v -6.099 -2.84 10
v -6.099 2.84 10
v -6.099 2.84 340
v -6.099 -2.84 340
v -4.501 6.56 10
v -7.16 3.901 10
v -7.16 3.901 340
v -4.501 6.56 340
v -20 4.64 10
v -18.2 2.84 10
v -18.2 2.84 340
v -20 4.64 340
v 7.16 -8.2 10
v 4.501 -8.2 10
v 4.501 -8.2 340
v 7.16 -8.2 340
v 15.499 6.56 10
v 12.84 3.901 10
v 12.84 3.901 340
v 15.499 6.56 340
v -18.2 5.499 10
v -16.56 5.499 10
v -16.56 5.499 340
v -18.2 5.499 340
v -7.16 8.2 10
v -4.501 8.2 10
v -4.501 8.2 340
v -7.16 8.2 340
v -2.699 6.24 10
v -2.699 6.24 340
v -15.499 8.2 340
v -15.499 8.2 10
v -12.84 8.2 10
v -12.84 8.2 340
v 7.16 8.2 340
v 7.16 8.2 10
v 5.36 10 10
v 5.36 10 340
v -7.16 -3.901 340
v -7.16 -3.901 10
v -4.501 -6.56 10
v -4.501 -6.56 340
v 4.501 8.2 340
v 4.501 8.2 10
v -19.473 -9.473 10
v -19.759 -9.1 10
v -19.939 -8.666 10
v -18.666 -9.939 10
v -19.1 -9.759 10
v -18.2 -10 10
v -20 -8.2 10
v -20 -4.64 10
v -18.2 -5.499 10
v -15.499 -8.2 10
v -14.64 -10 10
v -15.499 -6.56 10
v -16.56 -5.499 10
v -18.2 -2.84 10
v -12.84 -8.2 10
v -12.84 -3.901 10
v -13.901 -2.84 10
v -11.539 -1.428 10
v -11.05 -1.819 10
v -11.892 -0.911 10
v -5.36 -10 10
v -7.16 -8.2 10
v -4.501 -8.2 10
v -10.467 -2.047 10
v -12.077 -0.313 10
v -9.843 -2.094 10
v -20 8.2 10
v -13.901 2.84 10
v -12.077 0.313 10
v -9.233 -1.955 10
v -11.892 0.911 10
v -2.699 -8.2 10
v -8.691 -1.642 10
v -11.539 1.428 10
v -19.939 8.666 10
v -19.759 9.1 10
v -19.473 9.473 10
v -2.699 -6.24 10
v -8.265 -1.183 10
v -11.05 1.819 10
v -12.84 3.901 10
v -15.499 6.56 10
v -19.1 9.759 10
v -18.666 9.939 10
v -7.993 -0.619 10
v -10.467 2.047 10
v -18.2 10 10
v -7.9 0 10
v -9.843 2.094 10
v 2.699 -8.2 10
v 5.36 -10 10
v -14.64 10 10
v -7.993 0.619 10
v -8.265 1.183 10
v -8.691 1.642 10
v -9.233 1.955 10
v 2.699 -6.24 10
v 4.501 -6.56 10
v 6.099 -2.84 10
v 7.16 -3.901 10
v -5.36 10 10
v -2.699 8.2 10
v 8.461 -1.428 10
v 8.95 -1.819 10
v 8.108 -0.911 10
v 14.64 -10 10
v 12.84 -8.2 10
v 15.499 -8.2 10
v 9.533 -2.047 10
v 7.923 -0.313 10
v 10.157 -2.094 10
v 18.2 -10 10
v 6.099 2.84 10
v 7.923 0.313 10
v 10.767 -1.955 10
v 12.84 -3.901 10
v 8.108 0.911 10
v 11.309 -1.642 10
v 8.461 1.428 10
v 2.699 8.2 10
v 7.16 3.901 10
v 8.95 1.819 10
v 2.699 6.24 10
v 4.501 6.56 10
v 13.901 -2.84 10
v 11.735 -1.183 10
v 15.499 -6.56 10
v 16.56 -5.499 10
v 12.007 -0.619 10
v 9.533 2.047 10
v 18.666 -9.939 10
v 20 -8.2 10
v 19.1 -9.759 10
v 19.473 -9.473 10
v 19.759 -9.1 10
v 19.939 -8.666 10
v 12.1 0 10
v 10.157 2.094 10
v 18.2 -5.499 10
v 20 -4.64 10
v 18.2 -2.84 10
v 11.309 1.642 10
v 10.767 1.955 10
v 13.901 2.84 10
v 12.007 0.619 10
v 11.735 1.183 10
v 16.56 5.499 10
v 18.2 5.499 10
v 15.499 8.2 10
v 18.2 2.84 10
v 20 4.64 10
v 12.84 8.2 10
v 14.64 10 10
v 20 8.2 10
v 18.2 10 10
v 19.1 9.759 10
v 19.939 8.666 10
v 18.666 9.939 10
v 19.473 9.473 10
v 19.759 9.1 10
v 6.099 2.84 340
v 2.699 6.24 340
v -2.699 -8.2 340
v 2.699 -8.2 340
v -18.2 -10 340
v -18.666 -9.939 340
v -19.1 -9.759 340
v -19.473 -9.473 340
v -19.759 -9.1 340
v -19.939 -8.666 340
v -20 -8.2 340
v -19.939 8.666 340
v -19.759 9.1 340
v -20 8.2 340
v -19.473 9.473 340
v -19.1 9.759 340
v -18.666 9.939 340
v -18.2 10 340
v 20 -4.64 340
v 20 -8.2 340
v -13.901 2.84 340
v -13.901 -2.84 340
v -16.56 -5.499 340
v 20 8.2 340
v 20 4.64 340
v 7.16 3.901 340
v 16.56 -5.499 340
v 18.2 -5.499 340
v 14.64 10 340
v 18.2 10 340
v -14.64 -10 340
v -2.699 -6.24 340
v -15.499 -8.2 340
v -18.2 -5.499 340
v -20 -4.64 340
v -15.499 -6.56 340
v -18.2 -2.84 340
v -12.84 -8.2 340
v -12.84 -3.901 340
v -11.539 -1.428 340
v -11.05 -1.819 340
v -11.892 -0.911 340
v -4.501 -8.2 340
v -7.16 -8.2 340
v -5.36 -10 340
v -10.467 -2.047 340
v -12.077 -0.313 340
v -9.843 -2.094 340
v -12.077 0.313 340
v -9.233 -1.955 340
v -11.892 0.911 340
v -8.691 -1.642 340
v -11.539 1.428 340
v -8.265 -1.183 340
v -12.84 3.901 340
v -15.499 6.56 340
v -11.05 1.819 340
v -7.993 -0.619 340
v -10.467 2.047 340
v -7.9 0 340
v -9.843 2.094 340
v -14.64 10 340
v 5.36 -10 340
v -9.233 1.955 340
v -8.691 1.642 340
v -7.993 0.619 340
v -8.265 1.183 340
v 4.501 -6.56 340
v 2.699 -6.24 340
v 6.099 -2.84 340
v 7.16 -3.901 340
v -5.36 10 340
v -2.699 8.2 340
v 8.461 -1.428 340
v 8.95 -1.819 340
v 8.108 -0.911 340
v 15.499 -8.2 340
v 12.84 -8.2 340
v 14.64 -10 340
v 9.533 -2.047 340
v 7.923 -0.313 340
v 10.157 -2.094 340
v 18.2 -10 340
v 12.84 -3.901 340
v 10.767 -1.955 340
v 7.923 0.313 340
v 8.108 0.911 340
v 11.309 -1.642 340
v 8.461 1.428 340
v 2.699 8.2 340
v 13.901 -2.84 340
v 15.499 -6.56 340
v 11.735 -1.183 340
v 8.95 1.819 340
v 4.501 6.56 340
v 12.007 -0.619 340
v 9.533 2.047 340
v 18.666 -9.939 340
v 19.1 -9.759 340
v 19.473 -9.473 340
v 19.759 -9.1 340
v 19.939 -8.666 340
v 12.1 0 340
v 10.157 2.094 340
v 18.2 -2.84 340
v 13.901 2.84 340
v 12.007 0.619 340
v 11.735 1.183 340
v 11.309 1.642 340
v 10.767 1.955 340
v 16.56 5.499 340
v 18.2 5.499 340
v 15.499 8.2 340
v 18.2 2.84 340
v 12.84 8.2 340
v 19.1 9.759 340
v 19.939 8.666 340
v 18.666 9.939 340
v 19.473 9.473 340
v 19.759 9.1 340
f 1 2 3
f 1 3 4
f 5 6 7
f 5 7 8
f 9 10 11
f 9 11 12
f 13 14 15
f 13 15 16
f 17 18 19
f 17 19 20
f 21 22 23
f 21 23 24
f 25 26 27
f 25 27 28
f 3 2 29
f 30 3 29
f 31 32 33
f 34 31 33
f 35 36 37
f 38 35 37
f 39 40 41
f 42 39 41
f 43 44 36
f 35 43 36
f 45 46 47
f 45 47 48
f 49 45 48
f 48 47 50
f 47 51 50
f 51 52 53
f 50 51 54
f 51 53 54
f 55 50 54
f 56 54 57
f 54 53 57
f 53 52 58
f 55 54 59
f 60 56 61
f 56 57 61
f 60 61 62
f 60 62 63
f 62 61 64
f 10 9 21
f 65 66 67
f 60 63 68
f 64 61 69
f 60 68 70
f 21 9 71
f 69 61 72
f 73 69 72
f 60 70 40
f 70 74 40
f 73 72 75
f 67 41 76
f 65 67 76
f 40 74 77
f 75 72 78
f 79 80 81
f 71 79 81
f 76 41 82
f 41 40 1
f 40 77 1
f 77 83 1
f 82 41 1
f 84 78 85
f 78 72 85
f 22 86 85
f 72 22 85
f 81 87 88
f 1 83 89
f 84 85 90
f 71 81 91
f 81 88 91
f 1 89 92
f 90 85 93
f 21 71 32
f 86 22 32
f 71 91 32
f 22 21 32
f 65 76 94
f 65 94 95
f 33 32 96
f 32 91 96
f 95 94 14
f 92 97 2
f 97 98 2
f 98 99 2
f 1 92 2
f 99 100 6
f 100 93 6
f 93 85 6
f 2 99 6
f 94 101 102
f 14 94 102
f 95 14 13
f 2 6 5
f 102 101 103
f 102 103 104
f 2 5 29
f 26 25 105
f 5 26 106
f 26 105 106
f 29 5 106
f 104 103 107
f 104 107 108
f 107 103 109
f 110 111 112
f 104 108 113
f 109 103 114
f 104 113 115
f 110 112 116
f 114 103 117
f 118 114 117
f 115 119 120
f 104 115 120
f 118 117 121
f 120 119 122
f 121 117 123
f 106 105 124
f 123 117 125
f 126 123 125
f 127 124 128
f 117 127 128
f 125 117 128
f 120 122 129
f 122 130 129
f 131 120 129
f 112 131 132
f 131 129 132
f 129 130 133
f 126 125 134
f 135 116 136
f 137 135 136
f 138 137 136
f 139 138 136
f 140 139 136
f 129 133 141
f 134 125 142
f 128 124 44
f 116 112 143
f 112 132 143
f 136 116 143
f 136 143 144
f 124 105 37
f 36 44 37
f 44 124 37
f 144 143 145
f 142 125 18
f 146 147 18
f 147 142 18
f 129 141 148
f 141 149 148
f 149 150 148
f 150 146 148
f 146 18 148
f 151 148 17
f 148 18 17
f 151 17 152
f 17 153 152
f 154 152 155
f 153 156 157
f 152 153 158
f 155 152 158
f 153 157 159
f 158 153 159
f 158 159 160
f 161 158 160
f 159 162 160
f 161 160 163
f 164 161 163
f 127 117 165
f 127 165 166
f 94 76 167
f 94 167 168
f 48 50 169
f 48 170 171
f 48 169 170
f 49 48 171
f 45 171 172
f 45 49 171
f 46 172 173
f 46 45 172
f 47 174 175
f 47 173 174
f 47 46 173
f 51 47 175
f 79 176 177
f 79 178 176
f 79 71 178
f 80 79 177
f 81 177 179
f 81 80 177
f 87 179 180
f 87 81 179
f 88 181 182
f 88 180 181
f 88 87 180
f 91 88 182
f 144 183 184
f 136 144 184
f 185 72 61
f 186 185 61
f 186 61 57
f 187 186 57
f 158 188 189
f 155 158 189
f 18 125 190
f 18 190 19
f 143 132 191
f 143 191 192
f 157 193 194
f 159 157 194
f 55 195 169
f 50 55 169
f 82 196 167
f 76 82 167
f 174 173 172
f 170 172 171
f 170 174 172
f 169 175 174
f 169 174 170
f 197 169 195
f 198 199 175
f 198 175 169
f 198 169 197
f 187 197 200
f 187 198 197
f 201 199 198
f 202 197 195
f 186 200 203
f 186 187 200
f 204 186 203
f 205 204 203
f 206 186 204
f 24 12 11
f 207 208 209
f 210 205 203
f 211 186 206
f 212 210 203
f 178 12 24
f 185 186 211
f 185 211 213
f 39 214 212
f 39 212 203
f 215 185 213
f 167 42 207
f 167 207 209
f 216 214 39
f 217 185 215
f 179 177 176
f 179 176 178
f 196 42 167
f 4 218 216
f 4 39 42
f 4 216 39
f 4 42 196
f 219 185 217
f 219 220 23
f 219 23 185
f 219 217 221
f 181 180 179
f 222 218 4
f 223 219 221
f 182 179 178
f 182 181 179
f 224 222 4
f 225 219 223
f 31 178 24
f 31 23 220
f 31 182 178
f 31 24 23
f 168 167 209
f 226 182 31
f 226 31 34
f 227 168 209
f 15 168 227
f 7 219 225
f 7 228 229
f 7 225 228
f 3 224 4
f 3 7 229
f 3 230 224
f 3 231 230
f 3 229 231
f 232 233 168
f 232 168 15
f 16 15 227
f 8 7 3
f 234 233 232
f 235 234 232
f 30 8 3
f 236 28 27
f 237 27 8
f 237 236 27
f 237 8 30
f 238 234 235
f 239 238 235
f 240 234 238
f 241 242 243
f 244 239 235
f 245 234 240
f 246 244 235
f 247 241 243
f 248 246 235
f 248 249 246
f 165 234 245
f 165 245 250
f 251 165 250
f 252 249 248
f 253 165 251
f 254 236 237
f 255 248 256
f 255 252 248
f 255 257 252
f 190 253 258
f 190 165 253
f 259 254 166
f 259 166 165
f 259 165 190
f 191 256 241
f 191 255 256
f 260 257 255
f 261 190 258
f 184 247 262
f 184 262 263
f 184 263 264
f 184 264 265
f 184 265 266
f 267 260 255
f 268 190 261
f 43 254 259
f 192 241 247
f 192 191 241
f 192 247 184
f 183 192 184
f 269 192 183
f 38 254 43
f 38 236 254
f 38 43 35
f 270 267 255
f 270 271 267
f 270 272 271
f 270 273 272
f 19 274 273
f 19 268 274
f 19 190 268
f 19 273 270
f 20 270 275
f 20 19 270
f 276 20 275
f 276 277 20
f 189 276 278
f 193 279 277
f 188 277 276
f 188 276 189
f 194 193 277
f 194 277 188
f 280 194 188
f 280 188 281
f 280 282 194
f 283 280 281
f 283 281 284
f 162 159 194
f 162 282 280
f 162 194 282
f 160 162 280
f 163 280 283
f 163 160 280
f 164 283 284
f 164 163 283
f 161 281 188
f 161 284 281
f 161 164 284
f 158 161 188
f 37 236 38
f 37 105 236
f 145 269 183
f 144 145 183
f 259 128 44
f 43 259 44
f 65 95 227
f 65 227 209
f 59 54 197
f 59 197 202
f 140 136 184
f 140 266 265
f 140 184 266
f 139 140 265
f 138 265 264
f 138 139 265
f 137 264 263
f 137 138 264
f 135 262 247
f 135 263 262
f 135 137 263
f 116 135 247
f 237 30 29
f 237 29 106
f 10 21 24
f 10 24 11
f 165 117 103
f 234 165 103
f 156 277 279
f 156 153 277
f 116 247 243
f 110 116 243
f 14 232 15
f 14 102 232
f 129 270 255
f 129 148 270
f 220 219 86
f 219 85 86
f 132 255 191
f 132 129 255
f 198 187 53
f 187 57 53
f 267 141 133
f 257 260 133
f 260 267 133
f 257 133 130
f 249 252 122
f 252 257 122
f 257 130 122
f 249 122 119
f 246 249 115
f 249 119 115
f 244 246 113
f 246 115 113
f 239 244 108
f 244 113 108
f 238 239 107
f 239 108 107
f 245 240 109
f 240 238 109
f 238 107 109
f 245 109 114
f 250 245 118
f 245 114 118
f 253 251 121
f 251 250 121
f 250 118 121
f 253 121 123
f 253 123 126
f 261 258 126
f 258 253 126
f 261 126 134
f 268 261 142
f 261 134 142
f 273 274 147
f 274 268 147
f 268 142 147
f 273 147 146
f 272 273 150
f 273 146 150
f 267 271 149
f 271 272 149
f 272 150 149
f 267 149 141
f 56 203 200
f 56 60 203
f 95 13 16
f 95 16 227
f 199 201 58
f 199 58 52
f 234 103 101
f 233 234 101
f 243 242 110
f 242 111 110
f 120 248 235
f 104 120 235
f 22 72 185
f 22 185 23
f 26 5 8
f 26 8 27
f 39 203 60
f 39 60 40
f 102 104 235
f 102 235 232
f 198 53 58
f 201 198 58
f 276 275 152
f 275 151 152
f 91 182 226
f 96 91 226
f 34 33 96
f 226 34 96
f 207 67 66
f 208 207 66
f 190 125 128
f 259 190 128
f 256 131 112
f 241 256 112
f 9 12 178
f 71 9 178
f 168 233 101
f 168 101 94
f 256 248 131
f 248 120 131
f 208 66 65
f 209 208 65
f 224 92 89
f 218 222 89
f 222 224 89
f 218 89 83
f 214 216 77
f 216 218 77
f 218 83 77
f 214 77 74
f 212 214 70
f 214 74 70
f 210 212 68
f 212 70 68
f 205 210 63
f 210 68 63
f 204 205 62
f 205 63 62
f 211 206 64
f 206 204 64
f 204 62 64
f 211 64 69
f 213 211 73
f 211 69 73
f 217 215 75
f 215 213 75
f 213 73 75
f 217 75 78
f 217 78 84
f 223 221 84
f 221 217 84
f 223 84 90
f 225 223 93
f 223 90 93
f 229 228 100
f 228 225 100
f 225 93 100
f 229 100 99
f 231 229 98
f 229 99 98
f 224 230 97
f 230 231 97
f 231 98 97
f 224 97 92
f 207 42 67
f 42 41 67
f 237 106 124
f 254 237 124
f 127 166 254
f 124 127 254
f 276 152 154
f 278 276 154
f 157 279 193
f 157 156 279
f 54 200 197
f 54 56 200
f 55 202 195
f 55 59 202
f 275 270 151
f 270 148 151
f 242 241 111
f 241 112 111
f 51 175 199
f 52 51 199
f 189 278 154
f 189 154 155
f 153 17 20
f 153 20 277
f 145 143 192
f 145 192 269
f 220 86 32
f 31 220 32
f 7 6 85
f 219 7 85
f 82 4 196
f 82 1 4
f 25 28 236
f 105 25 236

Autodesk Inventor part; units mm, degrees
ref_plane "Start Plane" through (0, 0, 10) normal (0, 0, 1) x (1, 0, 0)
ref_plane "End Plane" through (0, 0, 340) normal (0, 0, 1) x (1, 0, 0)
sketch "Sketch" plane through (0, 0, 0) normal (0, 0, 1) x (1, 0, 0)
  line L0 (0, 0) -> (0, 10) construction
  line L1 (-10, 10) -> (-10, 0) construction
  line L2 (0, 0) -> (-10, 0) construction
  circle A0 centre (-10, 0) radius 2.1
  line L3 (-13.9007, 3.9007) -> (-6.0993, 3.9007) construction
  line L4 (-6.0993, 3.9007) -> (-6.0993, -3.9007) construction
  line L5 (-6.0993, -3.9007) -> (-13.9007, -3.9007) construction
  line L6 (-13.9007, -3.9007) -> (-13.9007, 3.9007) construction
  line L7 (-13.9007, 3.9007) -> (-6.0993, -3.9007) construction
  line L8 (-6.0993, 3.9007) -> (-13.9007, -3.9007) construction
  line L9 (-13.9007, -2.84) -> (-12.84, -3.9007) construction
  line L10 (-13.9007, -2.84) -> (-12.4007, -2.84) construction
  line L11 (-12.84, -3.9007) -> (-15.4993, -6.56)
  line L12 (-15.4993, -6.56) -> (-15.4993, -8.2)
  line L13 (-15.4993, -8.2) -> (-12.84, -8.2)
  line L14 (-12.84, -8.2) -> (-14.64, -10)
  line L15 (-7.16, -3.9007) -> (-4.5007, -6.56)
  line L16 (-4.5007, -6.56) -> (-4.5007, -8.2)
  line L17 (-4.5007, -8.2) -> (-7.16, -8.2)
  line L18 (-7.16, -8.2) -> (-5.36, -10)
  line L19 (-12.84, -3.9007) -> (-7.16, -3.9007)
  line L20 (-12.84, 3.9007) -> (-13.9007, 2.84) construction
  line L21 (-12.84, 3.9007) -> (-12.84, 2.4007) construction
  line L22 (-13.9007, 2.84) -> (-16.56, 5.4993)
  line L23 (-16.56, 5.4993) -> (-18.2, 5.4993)
  line L24 (-18.2, 5.4993) -> (-18.2, 2.84)
  line L25 (-18.2, 2.84) -> (-20, 4.64)
  line L26 (-18.2, -2.84) -> (-20, -4.64)
  line L27 (-18.2, -5.4993) -> (-18.2, -2.84)
  line L28 (-16.56, -5.4993) -> (-18.2, -5.4993)
  line L29 (-13.9007, -2.84) -> (-16.56, -5.4993)
  line L30 (-13.9007, 2.84) -> (-13.9007, -2.84)
  line L31 (-6.0993, 2.84) -> (-7.16, 3.9007) construction
  line L32 (-6.0993, 2.84) -> (-7.5993, 2.84) construction
  line L33 (-7.16, 3.9007) -> (-4.5007, 6.56)
  line L34 (-4.5007, 6.56) -> (-4.5007, 8.2)
  line L35 (-4.5007, 8.2) -> (-7.16, 8.2)
  line L36 (-7.16, 8.2) -> (-5.36, 10)
  line L37 (-12.84, 8.2) -> (-14.64, 10)
  line L38 (-15.4993, 8.2) -> (-12.84, 8.2)
  line L39 (-15.4993, 6.56) -> (-15.4993, 8.2)
  line L40 (-12.84, 3.9007) -> (-15.4993, 6.56)
  line L41 (-7.16, 3.9007) -> (-12.84, 3.9007)
  line L42 (-6.0993, 2.84) -> (-2.6993, 6.24)
  line L43 (-2.6993, 6.24) -> (-2.6993, 8.2)
  line L44 (-4.5007, 8.2) -> (0, 8.2) construction
  line L45 (-6.0993, -2.84) -> (-2.6993, -6.24)
  line L46 (-2.6993, -6.24) -> (-2.6993, -8.2)
  line L47 (10, 10) -> (10, 0) construction
  circle A1 centre (10, 0) radius 2.1
  line L48 (13.9007, 3.9007) -> (6.0993, -3.9007) construction
  line L49 (13.9007, -2.84) -> (12.84, -3.9007) construction
  line L50 (12.84, -3.9007) -> (15.4993, -6.56)
  line L51 (15.4993, -6.56) -> (15.4993, -8.2)
  line L52 (15.4993, -8.2) -> (12.84, -8.2)
  line L53 (12.84, -8.2) -> (14.64, -10)
  line L54 (7.16, -8.2) -> (5.36, -10)
  line L55 (4.5007, -8.2) -> (7.16, -8.2)
  line L56 (4.5007, -6.56) -> (4.5007, -8.2)
  line L57 (7.16, -3.9007) -> (4.5007, -6.56)
  line L58 (12.84, -3.9007) -> (7.16, -3.9007)
  line L59 (13.9007, 2.84) -> (13.9007, -2.84)
  line L60 (13.9007, 2.84) -> (16.56, 5.4993)
  line L61 (16.56, 5.4993) -> (18.2, 5.4993)
  line L62 (18.2, 5.4993) -> (18.2, 2.84)
  line L63 (18.2, 2.84) -> (20, 4.64)
  line L64 (18.2, -5.4993) -> (18.2, -2.84)
  line L65 (18.2, -2.84) -> (20, -4.64)
  line L66 (16.56, -5.4993) -> (18.2, -5.4993)
  line L67 (13.9007, -2.84) -> (16.56, -5.4993)
  line L68 (7.16, 3.9007) -> (12.84, 3.9007)
  line L69 (7.16, 3.9007) -> (4.5007, 6.56)
  line L70 (4.5007, 6.56) -> (4.5007, 8.2)
  line L71 (4.5007, 8.2) -> (7.16, 8.2)
  line L72 (7.16, 8.2) -> (5.36, 10)
  line L73 (15.4993, 8.2) -> (12.84, 8.2)
  line L74 (12.84, 8.2) -> (14.64, 10)
  line L75 (15.4993, 6.56) -> (15.4993, 8.2)
  line L76 (12.84, 3.9007) -> (15.4993, 6.56)
  line L77 (6.0993, 2.84) -> (2.6993, 6.24)
  line L78 (2.6993, 6.24) -> (2.6993, 8.2)
  line L79 (6.0993, -2.84) -> (2.6993, -6.24)
  line L80 (2.6993, -6.24) -> (2.6993, -8.2)
  line L81 (-14.64, -10) -> (-18.2, -10)
  line L82 (-20, -8.2) -> (-20, -4.64)
  line L83 (-20, 4.64) -> (-20, 8.2)
  line L84 (-18.2, 10) -> (-14.64, 10)
  line L85 (18.2, -10) -> (14.64, -10)
  line L86 (5.36, -10) -> (-5.36, -10)
  line L87 (-5.36, 10) -> (5.36, 10)
  line L88 (14.64, 10) -> (18.2, 10)
  line L89 (20, 8.2) -> (20, 4.64)
  line L90 (20, -4.64) -> (20, -8.2)
  line L91 (-2.6993, -8.2) -> (2.6993, -8.2)
  line L92 (-2.6993, 8.2) -> (2.6993, 8.2)
  line L93 (-6.0993, 2.84) -> (-6.0993, -2.84)
  line L94 (6.0993, 2.84) -> (6.0993, -2.84)
  arc A2 (-20, -8.2) -> (-18.2, -10) centre (-18.2, -8.2) ccw
  arc A3 (-18.2, 10) -> (-20, 8.2) centre (-18.2, 8.2) ccw
  arc A4 (18.2, -10) -> (20, -8.2) centre (18.2, -8.2) ccw
  arc A5 (20, 8.2) -> (18.2, 10) centre (18.2, 8.2) ccw
  point P0 (-13.9007, -3.9007)
  point P1 (-13.9007, 3.9007)
  point P2 (-13.9007, 3.9007)
  point P3 (-6.0993, 3.9007)
  point P4 (6.0993, 3.9007)
  point P5 (13.9007, -3.9007)
  point P6 (12.4007, -2.84)
  point P7 (13.9007, -3.9007)
  point P8 (13.9007, 3.9007)
  point P9 (12.84, 3.9007)
  point P10 (12.84, 2.4007)
  point P11 (13.9007, 3.9007)
  point P12 (6.0993, 3.9007)
  point P13 (7.5993, 2.84)
  point P14 (-20, 10)
  point P15 (20, -10)
  point P16 (20, 10)
  point P17 (-20, -10)
  dimension "d26" = 10
  dimension "d27" = 10
  dimension "d28" = 4.2
  dimension "d29" = 1.5
  dimension "d30" = 45
  dimension "d32" = 45
  dimension "d33" = 1.64
  dimension "d34" = 1.8
  dimension "d35" = 10
  dimension "d36" = 5.68
  dimension "d39" = 180
  dimension "d41" = 1.96
  dimension "d42" = 5.68
  dimension "d45" = 1.8
extrude "Body" add sketch "Sketch" along normal up to surface (330 mm away) from surface at 10
sketch "Sketch8" plane through (0, 0, 0) normal (0, 0, 1) x (1, 0, 0)
  line L0 (0, 0) -> (10, 0)
ref_plane "Work Plane5" through (0, 0, 0) normal (0, -1, 0) x (1, 0, 0)
sketch "Sketch9" plane through (0, 0, 0) normal (0, -1, 0) x (1, 0, 0)
  line L0 (-2, 10) -> (12, 10)
  line L1 (-2, 340) -> (12, 340)
  dimension "d51" = 330
ref_plane "Work Plane6" through (-20, 4.5951, 340) normal (0, 0, 1) x (1, 0, 0)
split "Split1" plane through (-20, 4.5951, 340) removes the side toward (0, 0, 1)
ref_plane "Work Plane7" through (255, 4.5951, 10) normal (0, 0, -1) x (-1, 0, 0)
split "Split2" plane through (255, 4.5951, 10) removes the side toward (0, 0, -1)
equation "\"d42\" = d36"
equation "\"G_L\" = d51"
properties part number "vslot 20 x 40" material "Aluminum 6061"
